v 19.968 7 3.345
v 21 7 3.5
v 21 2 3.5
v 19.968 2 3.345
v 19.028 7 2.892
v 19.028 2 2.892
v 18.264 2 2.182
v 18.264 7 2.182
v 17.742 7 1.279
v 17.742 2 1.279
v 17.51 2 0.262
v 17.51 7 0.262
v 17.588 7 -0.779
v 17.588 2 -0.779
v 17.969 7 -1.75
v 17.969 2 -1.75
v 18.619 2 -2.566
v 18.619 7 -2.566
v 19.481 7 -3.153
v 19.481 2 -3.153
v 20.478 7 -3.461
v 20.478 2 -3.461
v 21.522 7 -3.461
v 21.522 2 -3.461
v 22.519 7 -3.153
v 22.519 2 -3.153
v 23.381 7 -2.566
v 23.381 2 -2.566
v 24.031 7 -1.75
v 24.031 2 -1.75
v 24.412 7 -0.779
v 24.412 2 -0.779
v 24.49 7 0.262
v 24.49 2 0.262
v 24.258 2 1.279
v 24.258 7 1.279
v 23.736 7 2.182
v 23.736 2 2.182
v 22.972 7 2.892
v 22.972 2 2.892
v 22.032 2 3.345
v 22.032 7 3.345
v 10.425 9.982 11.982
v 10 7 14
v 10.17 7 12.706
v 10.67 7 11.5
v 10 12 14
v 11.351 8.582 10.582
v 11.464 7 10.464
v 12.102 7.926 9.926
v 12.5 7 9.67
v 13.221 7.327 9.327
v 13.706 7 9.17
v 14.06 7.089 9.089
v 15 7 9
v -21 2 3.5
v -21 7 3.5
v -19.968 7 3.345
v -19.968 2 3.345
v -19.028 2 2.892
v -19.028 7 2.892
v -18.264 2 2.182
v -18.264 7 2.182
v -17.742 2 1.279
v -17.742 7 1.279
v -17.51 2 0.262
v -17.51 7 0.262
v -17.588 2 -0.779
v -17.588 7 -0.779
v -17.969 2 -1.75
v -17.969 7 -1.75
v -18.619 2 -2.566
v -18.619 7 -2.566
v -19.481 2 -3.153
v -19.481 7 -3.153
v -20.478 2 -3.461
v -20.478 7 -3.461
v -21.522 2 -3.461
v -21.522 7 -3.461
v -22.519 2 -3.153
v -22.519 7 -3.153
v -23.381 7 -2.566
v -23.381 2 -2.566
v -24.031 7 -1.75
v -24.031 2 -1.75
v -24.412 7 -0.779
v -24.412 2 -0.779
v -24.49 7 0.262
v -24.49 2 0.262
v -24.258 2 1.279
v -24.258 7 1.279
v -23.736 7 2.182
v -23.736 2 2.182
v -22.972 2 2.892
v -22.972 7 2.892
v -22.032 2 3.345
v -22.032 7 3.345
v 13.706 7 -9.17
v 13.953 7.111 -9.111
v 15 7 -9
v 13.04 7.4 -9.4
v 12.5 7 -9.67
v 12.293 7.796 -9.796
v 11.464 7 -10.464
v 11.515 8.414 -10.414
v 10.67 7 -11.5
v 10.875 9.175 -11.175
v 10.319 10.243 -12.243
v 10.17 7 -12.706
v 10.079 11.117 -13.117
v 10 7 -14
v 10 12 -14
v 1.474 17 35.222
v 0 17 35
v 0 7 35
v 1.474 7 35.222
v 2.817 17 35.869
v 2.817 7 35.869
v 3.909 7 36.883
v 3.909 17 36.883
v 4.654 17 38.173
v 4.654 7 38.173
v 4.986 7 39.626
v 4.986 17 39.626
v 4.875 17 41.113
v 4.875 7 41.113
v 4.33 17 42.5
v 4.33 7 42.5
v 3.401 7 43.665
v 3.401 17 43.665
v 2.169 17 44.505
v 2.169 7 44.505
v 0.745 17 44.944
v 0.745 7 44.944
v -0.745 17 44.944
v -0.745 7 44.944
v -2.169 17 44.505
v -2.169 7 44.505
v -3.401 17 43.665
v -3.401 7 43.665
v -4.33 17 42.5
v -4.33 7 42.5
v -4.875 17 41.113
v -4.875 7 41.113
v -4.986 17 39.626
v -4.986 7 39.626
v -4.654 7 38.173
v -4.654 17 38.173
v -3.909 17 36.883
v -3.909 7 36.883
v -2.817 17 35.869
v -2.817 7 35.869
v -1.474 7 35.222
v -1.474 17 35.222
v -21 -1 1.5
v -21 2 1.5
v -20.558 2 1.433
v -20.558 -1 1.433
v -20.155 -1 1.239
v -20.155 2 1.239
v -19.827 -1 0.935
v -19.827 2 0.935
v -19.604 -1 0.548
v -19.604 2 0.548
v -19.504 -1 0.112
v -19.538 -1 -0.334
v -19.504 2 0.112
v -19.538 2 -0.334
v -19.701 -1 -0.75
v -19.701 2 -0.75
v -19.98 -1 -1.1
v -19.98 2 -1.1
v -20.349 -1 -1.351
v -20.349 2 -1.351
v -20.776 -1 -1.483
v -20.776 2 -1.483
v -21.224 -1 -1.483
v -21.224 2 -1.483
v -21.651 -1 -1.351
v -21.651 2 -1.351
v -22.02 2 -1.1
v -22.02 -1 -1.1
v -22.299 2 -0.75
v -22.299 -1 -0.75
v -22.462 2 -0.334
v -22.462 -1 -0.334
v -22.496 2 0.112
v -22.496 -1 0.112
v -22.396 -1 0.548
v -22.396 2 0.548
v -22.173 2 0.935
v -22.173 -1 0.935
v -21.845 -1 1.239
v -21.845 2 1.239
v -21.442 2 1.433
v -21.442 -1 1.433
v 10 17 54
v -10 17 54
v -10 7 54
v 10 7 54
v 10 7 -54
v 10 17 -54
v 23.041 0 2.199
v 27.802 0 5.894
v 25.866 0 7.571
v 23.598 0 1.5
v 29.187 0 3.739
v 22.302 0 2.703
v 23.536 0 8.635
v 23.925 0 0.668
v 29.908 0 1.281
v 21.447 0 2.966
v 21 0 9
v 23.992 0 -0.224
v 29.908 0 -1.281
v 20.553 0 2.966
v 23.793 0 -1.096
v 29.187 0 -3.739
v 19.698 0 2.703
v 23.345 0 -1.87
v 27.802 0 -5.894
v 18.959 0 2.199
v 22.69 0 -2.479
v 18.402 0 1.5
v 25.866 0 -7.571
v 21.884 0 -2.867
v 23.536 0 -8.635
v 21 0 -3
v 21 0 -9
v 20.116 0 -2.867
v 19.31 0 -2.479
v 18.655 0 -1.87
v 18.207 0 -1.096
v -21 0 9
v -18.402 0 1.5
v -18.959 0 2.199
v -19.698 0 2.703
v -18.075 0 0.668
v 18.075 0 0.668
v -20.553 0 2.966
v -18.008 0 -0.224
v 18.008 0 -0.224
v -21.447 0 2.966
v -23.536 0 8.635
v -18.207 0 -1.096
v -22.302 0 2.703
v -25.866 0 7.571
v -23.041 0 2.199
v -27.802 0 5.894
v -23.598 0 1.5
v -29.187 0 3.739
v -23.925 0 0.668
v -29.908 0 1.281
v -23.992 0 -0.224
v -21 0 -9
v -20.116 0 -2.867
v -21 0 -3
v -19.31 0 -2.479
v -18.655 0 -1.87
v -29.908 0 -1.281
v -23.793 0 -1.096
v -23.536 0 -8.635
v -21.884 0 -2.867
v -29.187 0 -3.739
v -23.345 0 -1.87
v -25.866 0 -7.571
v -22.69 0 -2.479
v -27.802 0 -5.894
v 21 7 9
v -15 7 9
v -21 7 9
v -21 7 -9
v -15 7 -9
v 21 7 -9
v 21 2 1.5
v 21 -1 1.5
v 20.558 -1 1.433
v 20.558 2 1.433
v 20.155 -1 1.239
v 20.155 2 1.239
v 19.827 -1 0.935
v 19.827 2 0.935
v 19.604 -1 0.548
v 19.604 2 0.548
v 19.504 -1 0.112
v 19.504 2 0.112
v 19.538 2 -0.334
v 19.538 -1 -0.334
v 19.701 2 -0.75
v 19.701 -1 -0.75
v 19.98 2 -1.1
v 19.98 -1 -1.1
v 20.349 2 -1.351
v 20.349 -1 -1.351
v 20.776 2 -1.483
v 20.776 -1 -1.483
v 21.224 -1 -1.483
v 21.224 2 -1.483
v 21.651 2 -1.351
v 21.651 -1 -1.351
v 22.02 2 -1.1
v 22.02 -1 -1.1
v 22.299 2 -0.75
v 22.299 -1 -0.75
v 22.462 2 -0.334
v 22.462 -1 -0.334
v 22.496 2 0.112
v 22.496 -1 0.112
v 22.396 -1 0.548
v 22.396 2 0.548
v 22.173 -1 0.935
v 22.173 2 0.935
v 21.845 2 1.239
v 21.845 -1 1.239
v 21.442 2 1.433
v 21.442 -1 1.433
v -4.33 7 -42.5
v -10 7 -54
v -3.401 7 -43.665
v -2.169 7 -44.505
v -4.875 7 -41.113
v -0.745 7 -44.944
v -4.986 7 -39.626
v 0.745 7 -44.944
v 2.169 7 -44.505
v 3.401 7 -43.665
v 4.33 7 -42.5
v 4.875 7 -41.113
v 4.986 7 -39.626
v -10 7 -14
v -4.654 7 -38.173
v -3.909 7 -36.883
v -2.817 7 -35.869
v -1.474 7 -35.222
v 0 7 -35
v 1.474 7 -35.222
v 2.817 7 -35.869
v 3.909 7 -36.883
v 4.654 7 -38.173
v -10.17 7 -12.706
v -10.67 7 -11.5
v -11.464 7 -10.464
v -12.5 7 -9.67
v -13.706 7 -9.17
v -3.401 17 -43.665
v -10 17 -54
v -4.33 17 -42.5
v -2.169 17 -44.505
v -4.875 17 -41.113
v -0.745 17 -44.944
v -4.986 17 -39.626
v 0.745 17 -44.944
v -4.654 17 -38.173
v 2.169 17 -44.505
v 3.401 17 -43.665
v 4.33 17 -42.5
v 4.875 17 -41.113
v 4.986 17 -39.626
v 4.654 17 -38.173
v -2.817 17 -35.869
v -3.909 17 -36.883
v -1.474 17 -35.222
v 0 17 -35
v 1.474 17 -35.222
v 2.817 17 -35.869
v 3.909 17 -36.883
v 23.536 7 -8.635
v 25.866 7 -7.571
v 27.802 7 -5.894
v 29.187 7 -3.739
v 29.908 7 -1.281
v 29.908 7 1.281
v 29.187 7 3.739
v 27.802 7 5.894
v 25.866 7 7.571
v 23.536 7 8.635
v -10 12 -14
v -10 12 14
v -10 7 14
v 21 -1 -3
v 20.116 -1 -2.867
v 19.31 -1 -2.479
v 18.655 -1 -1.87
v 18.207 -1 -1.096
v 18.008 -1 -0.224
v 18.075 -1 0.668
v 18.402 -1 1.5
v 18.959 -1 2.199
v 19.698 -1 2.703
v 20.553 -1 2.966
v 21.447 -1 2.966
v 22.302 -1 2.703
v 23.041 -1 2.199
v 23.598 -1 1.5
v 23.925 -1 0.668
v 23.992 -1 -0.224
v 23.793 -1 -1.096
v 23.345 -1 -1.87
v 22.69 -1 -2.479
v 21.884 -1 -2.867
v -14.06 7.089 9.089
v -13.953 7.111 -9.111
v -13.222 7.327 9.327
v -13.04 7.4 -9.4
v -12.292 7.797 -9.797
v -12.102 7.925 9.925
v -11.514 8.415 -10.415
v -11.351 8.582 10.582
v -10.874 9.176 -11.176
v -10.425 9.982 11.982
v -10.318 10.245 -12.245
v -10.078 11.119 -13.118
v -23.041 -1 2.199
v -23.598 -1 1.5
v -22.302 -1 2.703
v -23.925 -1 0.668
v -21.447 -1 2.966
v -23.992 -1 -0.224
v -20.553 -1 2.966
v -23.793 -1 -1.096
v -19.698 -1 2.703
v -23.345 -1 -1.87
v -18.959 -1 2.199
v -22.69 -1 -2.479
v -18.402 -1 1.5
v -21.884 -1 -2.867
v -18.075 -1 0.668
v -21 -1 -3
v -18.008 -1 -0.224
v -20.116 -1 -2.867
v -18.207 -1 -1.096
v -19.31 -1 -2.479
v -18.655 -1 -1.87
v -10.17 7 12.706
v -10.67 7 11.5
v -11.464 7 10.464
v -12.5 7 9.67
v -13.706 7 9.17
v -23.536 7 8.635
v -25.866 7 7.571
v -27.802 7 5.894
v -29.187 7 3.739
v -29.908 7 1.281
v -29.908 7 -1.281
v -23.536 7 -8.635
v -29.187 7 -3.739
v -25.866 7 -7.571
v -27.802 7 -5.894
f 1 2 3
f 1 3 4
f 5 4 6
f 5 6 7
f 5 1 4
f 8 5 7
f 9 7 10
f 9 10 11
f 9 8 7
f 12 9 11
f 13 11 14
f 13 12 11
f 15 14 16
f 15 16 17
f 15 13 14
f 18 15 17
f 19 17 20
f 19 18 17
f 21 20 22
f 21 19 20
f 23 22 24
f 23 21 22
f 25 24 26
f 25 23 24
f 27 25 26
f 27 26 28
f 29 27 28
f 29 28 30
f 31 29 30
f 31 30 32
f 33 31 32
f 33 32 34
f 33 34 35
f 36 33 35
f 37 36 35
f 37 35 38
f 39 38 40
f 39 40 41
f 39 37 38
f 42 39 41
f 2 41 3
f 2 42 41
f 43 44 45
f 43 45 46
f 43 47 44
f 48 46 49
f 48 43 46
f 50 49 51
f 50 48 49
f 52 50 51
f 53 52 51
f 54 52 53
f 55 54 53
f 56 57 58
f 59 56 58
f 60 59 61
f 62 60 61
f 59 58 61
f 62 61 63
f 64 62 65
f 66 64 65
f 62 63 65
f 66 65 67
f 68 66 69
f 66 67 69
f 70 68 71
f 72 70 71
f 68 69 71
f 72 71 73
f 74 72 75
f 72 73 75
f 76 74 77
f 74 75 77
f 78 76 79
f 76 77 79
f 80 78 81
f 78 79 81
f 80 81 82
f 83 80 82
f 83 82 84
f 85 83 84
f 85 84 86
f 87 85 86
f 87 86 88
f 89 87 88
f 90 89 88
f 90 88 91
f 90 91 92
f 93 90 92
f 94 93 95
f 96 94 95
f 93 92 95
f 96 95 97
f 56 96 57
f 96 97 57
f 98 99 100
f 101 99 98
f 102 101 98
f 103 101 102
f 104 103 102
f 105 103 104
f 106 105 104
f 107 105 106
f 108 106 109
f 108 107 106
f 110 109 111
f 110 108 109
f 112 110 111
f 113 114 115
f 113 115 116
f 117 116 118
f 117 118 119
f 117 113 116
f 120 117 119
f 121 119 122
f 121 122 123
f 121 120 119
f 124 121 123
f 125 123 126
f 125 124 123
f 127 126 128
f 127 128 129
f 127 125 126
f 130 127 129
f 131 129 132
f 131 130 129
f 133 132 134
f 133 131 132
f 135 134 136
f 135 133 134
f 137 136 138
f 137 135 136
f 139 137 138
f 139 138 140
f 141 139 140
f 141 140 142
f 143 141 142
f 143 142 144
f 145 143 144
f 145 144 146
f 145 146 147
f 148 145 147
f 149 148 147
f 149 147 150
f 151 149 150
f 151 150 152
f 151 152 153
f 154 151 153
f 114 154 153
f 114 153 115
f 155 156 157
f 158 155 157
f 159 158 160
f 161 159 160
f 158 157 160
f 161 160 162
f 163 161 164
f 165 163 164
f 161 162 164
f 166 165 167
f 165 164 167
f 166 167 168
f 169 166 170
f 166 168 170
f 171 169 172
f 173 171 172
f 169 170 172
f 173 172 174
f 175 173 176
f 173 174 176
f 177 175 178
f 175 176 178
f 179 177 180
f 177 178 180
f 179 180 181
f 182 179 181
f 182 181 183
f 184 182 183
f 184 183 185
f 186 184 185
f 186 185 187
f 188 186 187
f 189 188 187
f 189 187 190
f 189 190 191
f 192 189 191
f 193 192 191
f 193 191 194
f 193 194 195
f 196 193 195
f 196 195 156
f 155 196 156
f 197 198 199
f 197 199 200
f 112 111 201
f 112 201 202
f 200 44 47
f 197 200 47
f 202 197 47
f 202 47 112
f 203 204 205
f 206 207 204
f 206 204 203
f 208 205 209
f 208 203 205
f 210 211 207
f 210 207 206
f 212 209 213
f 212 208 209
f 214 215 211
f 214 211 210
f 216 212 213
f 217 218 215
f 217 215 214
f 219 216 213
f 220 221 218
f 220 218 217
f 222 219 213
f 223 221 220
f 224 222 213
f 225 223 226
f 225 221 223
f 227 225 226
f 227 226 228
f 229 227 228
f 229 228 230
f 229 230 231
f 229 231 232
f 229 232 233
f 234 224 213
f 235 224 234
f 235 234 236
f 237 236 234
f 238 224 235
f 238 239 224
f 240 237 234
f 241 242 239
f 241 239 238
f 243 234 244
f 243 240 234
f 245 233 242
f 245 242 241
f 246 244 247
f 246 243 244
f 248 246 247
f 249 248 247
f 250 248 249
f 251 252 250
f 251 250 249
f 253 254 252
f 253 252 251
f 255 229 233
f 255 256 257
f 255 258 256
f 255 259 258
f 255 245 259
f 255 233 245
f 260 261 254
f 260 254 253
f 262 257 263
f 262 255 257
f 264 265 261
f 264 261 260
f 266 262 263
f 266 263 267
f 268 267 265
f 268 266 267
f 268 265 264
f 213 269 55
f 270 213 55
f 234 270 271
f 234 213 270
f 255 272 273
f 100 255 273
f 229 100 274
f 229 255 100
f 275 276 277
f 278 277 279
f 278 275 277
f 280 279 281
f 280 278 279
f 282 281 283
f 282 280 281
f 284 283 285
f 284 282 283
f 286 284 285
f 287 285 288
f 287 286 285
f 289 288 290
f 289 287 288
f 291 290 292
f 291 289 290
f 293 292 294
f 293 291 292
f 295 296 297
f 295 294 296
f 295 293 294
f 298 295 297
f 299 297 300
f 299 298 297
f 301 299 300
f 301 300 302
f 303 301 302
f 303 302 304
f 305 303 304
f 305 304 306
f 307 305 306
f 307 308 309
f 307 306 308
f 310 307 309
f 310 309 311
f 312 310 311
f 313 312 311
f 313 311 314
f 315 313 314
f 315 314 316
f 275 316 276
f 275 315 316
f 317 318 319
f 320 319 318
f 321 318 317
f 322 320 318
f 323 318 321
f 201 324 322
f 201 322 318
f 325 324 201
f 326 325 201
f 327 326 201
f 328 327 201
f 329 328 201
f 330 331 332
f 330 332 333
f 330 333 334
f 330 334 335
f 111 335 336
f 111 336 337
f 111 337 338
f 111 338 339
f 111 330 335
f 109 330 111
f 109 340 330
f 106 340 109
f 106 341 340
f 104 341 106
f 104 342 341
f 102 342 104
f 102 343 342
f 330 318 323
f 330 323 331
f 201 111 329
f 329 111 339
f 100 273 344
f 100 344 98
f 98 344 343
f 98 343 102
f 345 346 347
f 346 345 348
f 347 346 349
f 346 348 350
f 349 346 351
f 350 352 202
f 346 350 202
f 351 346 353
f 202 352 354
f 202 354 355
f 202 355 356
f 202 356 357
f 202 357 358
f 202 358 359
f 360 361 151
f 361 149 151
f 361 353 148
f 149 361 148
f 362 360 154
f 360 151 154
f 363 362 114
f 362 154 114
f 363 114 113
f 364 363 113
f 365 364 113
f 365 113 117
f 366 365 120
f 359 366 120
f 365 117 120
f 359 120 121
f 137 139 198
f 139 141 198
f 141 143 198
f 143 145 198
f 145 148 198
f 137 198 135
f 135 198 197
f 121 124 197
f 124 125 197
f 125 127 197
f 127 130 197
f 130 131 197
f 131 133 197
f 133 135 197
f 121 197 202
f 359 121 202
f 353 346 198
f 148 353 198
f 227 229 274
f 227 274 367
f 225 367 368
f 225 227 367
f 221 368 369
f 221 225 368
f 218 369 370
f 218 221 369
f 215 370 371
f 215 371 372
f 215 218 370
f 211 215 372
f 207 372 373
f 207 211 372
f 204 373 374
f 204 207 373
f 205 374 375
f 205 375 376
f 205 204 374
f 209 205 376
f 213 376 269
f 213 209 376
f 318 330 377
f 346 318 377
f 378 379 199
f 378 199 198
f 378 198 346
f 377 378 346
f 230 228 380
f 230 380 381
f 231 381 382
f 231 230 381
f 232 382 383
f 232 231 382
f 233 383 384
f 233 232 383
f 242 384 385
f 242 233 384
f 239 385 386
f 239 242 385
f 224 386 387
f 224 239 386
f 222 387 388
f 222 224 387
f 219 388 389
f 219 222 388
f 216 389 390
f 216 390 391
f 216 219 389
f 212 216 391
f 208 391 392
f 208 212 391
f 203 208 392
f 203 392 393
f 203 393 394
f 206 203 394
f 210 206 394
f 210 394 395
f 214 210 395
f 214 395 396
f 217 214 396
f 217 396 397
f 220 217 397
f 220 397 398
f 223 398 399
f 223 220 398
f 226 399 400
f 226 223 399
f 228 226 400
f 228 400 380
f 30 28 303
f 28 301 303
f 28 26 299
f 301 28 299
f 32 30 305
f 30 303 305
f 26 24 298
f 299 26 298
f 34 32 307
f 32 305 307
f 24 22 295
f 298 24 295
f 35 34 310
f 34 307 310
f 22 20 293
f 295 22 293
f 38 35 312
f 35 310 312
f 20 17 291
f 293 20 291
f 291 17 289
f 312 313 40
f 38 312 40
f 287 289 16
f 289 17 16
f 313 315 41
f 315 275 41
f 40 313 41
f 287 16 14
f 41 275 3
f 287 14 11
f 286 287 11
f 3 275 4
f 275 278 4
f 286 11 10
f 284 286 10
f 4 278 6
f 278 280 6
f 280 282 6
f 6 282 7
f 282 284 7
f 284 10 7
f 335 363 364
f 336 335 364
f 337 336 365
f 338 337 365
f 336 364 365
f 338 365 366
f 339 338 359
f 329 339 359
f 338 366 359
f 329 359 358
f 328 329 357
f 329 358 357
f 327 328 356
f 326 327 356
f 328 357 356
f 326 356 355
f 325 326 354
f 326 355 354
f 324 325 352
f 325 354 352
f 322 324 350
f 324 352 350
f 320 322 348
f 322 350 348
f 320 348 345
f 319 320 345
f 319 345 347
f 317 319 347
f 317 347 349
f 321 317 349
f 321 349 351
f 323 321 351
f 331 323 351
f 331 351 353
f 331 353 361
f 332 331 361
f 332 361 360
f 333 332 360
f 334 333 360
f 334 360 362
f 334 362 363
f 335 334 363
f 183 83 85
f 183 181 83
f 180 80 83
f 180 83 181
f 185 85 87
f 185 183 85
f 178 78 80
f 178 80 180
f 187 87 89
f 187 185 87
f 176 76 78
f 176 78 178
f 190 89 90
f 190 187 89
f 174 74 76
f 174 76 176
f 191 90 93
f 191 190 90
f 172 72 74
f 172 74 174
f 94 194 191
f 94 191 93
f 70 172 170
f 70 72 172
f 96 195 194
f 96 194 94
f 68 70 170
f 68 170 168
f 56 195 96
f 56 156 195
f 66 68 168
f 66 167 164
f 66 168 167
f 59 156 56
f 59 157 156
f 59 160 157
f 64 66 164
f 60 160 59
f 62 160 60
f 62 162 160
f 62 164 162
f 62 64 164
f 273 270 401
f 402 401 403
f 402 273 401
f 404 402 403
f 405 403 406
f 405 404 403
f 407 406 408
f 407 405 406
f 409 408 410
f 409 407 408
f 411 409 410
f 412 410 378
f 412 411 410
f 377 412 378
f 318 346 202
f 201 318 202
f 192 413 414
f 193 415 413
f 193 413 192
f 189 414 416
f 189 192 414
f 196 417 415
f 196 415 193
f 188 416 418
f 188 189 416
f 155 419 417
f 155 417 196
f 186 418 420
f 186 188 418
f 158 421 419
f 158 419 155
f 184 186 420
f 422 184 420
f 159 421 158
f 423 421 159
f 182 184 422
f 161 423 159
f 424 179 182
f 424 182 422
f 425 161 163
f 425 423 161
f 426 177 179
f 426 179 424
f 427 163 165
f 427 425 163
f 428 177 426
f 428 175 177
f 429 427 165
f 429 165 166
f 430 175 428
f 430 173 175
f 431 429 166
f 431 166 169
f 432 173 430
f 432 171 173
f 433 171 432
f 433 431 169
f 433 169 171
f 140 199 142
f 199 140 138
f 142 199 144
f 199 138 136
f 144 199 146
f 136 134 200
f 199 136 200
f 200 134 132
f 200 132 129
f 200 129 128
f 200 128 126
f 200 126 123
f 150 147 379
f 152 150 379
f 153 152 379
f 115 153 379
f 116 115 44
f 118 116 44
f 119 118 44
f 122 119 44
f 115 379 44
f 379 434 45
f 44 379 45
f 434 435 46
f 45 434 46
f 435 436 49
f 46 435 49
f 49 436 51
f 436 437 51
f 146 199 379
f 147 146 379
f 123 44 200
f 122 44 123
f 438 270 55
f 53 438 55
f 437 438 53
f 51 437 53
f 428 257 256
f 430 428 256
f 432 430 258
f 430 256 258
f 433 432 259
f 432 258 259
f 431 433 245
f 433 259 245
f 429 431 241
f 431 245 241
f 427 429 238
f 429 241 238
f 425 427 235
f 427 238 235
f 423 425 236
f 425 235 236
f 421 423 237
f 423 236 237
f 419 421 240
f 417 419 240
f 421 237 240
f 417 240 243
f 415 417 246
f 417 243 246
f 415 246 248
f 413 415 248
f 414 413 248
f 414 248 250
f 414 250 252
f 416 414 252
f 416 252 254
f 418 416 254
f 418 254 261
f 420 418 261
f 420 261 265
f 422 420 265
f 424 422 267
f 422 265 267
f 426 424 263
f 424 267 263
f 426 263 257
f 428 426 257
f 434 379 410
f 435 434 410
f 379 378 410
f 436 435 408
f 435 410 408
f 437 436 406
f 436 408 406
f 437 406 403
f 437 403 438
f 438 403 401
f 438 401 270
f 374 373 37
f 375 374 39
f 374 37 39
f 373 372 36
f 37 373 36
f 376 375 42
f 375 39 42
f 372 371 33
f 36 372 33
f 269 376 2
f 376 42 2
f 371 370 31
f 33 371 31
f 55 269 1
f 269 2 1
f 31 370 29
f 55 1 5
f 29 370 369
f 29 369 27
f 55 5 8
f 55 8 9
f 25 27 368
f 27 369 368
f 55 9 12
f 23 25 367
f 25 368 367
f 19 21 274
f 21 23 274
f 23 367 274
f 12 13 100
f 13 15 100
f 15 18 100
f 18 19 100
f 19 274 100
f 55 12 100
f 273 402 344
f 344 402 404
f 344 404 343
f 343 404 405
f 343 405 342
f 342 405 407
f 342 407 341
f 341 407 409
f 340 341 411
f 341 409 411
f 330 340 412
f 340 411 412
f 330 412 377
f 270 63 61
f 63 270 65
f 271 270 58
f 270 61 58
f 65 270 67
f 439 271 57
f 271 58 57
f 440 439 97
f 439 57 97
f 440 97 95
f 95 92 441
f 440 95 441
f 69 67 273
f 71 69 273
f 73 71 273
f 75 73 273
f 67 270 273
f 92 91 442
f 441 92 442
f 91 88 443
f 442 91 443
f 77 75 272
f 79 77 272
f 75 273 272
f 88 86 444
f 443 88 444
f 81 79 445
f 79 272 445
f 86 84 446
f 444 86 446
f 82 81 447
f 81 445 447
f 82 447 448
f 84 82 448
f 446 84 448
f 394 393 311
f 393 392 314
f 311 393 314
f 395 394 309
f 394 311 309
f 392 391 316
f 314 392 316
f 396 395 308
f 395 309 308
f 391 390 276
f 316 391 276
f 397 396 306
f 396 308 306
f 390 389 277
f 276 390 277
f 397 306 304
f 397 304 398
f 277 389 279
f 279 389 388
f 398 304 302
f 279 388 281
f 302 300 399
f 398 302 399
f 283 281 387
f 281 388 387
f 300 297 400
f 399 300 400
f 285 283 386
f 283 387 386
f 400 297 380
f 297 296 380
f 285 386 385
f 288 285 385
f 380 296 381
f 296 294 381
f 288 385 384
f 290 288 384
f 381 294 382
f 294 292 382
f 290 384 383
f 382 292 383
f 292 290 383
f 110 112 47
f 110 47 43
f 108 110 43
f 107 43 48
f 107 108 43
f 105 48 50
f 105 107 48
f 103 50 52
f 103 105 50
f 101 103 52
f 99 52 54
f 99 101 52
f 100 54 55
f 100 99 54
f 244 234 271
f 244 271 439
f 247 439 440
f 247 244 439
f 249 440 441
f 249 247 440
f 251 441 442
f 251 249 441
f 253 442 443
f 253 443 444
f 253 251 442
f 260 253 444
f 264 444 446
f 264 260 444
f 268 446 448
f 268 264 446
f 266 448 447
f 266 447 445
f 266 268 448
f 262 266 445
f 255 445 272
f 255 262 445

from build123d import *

# Parameters (mm, degrees)
BOSS_EXTRUDE1_DEPTH = 7
SKETCH2_R           = 3
BOSS_EXTRUDE2_DEPTH = 1
SKETCH3_R           = 3.5
CUT_EXTRUDE1_DEPTH  = 5
SKETCH4_R           = 1.5
CUT_EXTRUDE2_DEPTH  = 32.717503054
SKETCH17_W          = 20
SKETCH17_H          = 18
BOSS_EXTRUDE6_DEPTH = 10
SKETCH18_W          = 20
SKETCH18_H          = 10
BOSS_EXTRUDE7_DEPTH = 45
CUT_EXTRUDE6_REACH  = 66.343
SKETCH19_R          = 5
FILLET4_R           = 5
FILLET6_R           = 5
FILLET8_R           = 5


with BuildPart() as part:
    # Sketch1 → Boss-Extrude1 (new body)
    with BuildSketch(Plane(origin=(0, 0, 0), x_dir=(1, 0, 0), z_dir=(0, 1, 0))):
        with BuildLine():
            Line((-21, 9), (21, 9))
            ThreePointArc((21, 9), (30, 0), (21, -9))
            Line((21, -9), (-21, -9))
            ThreePointArc((-21, -9), (-30, 0), (-21, 9))
        make_face()
    extrude(amount=BOSS_EXTRUDE1_DEPTH)

    # Sketch2 → Boss-Extrude2 (add)
    with BuildSketch(Plane.XZ):
        with Locations(Location((-21, 0, 0), (0, 0, 270))):
            Circle(SKETCH2_R)
    boss_extrude2 = extrude(amount=BOSS_EXTRUDE2_DEPTH)

    # Sketch3 → Cut-Extrude1 (cut)
    with BuildSketch(Plane(origin=(0, 7, 0), x_dir=(1, 0, 0), z_dir=(0, 1, 0))):
        with Locations(Location((-21, 0, 0), (0, 0, 270))):
            Circle(SKETCH3_R)
    cut_extrude1 = extrude(amount=-CUT_EXTRUDE1_DEPTH, mode=Mode.SUBTRACT)

    # Sketch4 → Cut-Extrude2 (cut, through all)
    with BuildSketch(Plane(origin=(0, 2, 0), x_dir=(1, 0, 0), z_dir=(0, 1, 0))):
        with Locations(Location((-21, 0, 0), (0, 0, 270))):
            Circle(SKETCH4_R)
    cut_extrude2 = extrude(amount=-CUT_EXTRUDE2_DEPTH, mode=Mode.SUBTRACT)

    # Mirror1: Boss-Extrude2, Cut-Extrude1, Cut-Extrude2 across plane
    add(boss_extrude2.mirror(Plane(origin=(0, 0, 0), x_dir=(0, 0, 1), z_dir=(1, 0, 0))))
    add(cut_extrude1.mirror(Plane(origin=(0, 0, 0), x_dir=(0, 0, 1), z_dir=(1, 0, 0))), mode=Mode.SUBTRACT)
    add(cut_extrude2.mirror(Plane(origin=(0, 0, 0), x_dir=(0, 0, 1), z_dir=(1, 0, 0))), mode=Mode.SUBTRACT)

    # Sketch17 → Boss-Extrude6 (add)
    with BuildSketch(Plane(origin=(0, 7, 0), x_dir=(1, 0, 0), z_dir=(0, 1, 0))):
        Rectangle(SKETCH17_W, SKETCH17_H)
    extrude(amount=BOSS_EXTRUDE6_DEPTH)

    # Sketch18 → Boss-Extrude7 (add)
    with BuildSketch(Plane.XY.offset(9)):
        with Locations((0, 12)):
            Rectangle(SKETCH18_W, SKETCH18_H)
    boss_extrude7 = extrude(amount=BOSS_EXTRUDE7_DEPTH)

    # Mirror3: Boss-Extrude7 across plane
    add(boss_extrude7.mirror(Plane.XY))

    # Sketch19 → Cut-Extrude6 (cut, up to next)
    with BuildSketch(Plane(origin=(0, 17, 0), x_dir=(1, 0, 0), z_dir=(0, 1, 0)), mode=Mode.PRIVATE) as cut_extrude6_sk1:
        with Locations(Location((0, 40, 0), (0, 0, 270))):
            Circle(SKETCH19_R)
    cut_extrude6_tool1 = extrude(cut_extrude6_sk1.sketch, amount=-CUT_EXTRUDE6_REACH, mode=Mode.PRIVATE) & part.part
    cut_extrude6 = cut_extrude6_tool1.solids().sort_by_distance((0, 17, -40))[0]
    add(cut_extrude6, mode=Mode.SUBTRACT)

    # Mirror4: Cut-Extrude6 across plane
    add(cut_extrude6.mirror(Plane.XY), mode=Mode.SUBTRACT)

    # Fillet4
    fillet4_edges = [part.edges().sort_by_distance(p)[0] for p in [
        (10, 7, 0),
    ]]
    fillet(fillet4_edges, radius=FILLET4_R)

    # Fillet6
    fillet6_edges = [part.edges().sort_by_distance(p)[0] for p in [
        (-10, 7, 0),
    ]]
    fillet(fillet6_edges, radius=FILLET6_R)

    # Fillet8
    fillet8_edges = [part.edges().sort_by_distance(p)[0] for p in [
        (-10, 9.5, 9),
        (-10, 9.5, -9),
        (10, 9.5, -9),
        (10, 9.5, 9),
    ]]
    fillet(fillet8_edges, radius=FILLET8_R - 0.0001)  # a hair under: the kernel refuses the full size


solid = part.part
